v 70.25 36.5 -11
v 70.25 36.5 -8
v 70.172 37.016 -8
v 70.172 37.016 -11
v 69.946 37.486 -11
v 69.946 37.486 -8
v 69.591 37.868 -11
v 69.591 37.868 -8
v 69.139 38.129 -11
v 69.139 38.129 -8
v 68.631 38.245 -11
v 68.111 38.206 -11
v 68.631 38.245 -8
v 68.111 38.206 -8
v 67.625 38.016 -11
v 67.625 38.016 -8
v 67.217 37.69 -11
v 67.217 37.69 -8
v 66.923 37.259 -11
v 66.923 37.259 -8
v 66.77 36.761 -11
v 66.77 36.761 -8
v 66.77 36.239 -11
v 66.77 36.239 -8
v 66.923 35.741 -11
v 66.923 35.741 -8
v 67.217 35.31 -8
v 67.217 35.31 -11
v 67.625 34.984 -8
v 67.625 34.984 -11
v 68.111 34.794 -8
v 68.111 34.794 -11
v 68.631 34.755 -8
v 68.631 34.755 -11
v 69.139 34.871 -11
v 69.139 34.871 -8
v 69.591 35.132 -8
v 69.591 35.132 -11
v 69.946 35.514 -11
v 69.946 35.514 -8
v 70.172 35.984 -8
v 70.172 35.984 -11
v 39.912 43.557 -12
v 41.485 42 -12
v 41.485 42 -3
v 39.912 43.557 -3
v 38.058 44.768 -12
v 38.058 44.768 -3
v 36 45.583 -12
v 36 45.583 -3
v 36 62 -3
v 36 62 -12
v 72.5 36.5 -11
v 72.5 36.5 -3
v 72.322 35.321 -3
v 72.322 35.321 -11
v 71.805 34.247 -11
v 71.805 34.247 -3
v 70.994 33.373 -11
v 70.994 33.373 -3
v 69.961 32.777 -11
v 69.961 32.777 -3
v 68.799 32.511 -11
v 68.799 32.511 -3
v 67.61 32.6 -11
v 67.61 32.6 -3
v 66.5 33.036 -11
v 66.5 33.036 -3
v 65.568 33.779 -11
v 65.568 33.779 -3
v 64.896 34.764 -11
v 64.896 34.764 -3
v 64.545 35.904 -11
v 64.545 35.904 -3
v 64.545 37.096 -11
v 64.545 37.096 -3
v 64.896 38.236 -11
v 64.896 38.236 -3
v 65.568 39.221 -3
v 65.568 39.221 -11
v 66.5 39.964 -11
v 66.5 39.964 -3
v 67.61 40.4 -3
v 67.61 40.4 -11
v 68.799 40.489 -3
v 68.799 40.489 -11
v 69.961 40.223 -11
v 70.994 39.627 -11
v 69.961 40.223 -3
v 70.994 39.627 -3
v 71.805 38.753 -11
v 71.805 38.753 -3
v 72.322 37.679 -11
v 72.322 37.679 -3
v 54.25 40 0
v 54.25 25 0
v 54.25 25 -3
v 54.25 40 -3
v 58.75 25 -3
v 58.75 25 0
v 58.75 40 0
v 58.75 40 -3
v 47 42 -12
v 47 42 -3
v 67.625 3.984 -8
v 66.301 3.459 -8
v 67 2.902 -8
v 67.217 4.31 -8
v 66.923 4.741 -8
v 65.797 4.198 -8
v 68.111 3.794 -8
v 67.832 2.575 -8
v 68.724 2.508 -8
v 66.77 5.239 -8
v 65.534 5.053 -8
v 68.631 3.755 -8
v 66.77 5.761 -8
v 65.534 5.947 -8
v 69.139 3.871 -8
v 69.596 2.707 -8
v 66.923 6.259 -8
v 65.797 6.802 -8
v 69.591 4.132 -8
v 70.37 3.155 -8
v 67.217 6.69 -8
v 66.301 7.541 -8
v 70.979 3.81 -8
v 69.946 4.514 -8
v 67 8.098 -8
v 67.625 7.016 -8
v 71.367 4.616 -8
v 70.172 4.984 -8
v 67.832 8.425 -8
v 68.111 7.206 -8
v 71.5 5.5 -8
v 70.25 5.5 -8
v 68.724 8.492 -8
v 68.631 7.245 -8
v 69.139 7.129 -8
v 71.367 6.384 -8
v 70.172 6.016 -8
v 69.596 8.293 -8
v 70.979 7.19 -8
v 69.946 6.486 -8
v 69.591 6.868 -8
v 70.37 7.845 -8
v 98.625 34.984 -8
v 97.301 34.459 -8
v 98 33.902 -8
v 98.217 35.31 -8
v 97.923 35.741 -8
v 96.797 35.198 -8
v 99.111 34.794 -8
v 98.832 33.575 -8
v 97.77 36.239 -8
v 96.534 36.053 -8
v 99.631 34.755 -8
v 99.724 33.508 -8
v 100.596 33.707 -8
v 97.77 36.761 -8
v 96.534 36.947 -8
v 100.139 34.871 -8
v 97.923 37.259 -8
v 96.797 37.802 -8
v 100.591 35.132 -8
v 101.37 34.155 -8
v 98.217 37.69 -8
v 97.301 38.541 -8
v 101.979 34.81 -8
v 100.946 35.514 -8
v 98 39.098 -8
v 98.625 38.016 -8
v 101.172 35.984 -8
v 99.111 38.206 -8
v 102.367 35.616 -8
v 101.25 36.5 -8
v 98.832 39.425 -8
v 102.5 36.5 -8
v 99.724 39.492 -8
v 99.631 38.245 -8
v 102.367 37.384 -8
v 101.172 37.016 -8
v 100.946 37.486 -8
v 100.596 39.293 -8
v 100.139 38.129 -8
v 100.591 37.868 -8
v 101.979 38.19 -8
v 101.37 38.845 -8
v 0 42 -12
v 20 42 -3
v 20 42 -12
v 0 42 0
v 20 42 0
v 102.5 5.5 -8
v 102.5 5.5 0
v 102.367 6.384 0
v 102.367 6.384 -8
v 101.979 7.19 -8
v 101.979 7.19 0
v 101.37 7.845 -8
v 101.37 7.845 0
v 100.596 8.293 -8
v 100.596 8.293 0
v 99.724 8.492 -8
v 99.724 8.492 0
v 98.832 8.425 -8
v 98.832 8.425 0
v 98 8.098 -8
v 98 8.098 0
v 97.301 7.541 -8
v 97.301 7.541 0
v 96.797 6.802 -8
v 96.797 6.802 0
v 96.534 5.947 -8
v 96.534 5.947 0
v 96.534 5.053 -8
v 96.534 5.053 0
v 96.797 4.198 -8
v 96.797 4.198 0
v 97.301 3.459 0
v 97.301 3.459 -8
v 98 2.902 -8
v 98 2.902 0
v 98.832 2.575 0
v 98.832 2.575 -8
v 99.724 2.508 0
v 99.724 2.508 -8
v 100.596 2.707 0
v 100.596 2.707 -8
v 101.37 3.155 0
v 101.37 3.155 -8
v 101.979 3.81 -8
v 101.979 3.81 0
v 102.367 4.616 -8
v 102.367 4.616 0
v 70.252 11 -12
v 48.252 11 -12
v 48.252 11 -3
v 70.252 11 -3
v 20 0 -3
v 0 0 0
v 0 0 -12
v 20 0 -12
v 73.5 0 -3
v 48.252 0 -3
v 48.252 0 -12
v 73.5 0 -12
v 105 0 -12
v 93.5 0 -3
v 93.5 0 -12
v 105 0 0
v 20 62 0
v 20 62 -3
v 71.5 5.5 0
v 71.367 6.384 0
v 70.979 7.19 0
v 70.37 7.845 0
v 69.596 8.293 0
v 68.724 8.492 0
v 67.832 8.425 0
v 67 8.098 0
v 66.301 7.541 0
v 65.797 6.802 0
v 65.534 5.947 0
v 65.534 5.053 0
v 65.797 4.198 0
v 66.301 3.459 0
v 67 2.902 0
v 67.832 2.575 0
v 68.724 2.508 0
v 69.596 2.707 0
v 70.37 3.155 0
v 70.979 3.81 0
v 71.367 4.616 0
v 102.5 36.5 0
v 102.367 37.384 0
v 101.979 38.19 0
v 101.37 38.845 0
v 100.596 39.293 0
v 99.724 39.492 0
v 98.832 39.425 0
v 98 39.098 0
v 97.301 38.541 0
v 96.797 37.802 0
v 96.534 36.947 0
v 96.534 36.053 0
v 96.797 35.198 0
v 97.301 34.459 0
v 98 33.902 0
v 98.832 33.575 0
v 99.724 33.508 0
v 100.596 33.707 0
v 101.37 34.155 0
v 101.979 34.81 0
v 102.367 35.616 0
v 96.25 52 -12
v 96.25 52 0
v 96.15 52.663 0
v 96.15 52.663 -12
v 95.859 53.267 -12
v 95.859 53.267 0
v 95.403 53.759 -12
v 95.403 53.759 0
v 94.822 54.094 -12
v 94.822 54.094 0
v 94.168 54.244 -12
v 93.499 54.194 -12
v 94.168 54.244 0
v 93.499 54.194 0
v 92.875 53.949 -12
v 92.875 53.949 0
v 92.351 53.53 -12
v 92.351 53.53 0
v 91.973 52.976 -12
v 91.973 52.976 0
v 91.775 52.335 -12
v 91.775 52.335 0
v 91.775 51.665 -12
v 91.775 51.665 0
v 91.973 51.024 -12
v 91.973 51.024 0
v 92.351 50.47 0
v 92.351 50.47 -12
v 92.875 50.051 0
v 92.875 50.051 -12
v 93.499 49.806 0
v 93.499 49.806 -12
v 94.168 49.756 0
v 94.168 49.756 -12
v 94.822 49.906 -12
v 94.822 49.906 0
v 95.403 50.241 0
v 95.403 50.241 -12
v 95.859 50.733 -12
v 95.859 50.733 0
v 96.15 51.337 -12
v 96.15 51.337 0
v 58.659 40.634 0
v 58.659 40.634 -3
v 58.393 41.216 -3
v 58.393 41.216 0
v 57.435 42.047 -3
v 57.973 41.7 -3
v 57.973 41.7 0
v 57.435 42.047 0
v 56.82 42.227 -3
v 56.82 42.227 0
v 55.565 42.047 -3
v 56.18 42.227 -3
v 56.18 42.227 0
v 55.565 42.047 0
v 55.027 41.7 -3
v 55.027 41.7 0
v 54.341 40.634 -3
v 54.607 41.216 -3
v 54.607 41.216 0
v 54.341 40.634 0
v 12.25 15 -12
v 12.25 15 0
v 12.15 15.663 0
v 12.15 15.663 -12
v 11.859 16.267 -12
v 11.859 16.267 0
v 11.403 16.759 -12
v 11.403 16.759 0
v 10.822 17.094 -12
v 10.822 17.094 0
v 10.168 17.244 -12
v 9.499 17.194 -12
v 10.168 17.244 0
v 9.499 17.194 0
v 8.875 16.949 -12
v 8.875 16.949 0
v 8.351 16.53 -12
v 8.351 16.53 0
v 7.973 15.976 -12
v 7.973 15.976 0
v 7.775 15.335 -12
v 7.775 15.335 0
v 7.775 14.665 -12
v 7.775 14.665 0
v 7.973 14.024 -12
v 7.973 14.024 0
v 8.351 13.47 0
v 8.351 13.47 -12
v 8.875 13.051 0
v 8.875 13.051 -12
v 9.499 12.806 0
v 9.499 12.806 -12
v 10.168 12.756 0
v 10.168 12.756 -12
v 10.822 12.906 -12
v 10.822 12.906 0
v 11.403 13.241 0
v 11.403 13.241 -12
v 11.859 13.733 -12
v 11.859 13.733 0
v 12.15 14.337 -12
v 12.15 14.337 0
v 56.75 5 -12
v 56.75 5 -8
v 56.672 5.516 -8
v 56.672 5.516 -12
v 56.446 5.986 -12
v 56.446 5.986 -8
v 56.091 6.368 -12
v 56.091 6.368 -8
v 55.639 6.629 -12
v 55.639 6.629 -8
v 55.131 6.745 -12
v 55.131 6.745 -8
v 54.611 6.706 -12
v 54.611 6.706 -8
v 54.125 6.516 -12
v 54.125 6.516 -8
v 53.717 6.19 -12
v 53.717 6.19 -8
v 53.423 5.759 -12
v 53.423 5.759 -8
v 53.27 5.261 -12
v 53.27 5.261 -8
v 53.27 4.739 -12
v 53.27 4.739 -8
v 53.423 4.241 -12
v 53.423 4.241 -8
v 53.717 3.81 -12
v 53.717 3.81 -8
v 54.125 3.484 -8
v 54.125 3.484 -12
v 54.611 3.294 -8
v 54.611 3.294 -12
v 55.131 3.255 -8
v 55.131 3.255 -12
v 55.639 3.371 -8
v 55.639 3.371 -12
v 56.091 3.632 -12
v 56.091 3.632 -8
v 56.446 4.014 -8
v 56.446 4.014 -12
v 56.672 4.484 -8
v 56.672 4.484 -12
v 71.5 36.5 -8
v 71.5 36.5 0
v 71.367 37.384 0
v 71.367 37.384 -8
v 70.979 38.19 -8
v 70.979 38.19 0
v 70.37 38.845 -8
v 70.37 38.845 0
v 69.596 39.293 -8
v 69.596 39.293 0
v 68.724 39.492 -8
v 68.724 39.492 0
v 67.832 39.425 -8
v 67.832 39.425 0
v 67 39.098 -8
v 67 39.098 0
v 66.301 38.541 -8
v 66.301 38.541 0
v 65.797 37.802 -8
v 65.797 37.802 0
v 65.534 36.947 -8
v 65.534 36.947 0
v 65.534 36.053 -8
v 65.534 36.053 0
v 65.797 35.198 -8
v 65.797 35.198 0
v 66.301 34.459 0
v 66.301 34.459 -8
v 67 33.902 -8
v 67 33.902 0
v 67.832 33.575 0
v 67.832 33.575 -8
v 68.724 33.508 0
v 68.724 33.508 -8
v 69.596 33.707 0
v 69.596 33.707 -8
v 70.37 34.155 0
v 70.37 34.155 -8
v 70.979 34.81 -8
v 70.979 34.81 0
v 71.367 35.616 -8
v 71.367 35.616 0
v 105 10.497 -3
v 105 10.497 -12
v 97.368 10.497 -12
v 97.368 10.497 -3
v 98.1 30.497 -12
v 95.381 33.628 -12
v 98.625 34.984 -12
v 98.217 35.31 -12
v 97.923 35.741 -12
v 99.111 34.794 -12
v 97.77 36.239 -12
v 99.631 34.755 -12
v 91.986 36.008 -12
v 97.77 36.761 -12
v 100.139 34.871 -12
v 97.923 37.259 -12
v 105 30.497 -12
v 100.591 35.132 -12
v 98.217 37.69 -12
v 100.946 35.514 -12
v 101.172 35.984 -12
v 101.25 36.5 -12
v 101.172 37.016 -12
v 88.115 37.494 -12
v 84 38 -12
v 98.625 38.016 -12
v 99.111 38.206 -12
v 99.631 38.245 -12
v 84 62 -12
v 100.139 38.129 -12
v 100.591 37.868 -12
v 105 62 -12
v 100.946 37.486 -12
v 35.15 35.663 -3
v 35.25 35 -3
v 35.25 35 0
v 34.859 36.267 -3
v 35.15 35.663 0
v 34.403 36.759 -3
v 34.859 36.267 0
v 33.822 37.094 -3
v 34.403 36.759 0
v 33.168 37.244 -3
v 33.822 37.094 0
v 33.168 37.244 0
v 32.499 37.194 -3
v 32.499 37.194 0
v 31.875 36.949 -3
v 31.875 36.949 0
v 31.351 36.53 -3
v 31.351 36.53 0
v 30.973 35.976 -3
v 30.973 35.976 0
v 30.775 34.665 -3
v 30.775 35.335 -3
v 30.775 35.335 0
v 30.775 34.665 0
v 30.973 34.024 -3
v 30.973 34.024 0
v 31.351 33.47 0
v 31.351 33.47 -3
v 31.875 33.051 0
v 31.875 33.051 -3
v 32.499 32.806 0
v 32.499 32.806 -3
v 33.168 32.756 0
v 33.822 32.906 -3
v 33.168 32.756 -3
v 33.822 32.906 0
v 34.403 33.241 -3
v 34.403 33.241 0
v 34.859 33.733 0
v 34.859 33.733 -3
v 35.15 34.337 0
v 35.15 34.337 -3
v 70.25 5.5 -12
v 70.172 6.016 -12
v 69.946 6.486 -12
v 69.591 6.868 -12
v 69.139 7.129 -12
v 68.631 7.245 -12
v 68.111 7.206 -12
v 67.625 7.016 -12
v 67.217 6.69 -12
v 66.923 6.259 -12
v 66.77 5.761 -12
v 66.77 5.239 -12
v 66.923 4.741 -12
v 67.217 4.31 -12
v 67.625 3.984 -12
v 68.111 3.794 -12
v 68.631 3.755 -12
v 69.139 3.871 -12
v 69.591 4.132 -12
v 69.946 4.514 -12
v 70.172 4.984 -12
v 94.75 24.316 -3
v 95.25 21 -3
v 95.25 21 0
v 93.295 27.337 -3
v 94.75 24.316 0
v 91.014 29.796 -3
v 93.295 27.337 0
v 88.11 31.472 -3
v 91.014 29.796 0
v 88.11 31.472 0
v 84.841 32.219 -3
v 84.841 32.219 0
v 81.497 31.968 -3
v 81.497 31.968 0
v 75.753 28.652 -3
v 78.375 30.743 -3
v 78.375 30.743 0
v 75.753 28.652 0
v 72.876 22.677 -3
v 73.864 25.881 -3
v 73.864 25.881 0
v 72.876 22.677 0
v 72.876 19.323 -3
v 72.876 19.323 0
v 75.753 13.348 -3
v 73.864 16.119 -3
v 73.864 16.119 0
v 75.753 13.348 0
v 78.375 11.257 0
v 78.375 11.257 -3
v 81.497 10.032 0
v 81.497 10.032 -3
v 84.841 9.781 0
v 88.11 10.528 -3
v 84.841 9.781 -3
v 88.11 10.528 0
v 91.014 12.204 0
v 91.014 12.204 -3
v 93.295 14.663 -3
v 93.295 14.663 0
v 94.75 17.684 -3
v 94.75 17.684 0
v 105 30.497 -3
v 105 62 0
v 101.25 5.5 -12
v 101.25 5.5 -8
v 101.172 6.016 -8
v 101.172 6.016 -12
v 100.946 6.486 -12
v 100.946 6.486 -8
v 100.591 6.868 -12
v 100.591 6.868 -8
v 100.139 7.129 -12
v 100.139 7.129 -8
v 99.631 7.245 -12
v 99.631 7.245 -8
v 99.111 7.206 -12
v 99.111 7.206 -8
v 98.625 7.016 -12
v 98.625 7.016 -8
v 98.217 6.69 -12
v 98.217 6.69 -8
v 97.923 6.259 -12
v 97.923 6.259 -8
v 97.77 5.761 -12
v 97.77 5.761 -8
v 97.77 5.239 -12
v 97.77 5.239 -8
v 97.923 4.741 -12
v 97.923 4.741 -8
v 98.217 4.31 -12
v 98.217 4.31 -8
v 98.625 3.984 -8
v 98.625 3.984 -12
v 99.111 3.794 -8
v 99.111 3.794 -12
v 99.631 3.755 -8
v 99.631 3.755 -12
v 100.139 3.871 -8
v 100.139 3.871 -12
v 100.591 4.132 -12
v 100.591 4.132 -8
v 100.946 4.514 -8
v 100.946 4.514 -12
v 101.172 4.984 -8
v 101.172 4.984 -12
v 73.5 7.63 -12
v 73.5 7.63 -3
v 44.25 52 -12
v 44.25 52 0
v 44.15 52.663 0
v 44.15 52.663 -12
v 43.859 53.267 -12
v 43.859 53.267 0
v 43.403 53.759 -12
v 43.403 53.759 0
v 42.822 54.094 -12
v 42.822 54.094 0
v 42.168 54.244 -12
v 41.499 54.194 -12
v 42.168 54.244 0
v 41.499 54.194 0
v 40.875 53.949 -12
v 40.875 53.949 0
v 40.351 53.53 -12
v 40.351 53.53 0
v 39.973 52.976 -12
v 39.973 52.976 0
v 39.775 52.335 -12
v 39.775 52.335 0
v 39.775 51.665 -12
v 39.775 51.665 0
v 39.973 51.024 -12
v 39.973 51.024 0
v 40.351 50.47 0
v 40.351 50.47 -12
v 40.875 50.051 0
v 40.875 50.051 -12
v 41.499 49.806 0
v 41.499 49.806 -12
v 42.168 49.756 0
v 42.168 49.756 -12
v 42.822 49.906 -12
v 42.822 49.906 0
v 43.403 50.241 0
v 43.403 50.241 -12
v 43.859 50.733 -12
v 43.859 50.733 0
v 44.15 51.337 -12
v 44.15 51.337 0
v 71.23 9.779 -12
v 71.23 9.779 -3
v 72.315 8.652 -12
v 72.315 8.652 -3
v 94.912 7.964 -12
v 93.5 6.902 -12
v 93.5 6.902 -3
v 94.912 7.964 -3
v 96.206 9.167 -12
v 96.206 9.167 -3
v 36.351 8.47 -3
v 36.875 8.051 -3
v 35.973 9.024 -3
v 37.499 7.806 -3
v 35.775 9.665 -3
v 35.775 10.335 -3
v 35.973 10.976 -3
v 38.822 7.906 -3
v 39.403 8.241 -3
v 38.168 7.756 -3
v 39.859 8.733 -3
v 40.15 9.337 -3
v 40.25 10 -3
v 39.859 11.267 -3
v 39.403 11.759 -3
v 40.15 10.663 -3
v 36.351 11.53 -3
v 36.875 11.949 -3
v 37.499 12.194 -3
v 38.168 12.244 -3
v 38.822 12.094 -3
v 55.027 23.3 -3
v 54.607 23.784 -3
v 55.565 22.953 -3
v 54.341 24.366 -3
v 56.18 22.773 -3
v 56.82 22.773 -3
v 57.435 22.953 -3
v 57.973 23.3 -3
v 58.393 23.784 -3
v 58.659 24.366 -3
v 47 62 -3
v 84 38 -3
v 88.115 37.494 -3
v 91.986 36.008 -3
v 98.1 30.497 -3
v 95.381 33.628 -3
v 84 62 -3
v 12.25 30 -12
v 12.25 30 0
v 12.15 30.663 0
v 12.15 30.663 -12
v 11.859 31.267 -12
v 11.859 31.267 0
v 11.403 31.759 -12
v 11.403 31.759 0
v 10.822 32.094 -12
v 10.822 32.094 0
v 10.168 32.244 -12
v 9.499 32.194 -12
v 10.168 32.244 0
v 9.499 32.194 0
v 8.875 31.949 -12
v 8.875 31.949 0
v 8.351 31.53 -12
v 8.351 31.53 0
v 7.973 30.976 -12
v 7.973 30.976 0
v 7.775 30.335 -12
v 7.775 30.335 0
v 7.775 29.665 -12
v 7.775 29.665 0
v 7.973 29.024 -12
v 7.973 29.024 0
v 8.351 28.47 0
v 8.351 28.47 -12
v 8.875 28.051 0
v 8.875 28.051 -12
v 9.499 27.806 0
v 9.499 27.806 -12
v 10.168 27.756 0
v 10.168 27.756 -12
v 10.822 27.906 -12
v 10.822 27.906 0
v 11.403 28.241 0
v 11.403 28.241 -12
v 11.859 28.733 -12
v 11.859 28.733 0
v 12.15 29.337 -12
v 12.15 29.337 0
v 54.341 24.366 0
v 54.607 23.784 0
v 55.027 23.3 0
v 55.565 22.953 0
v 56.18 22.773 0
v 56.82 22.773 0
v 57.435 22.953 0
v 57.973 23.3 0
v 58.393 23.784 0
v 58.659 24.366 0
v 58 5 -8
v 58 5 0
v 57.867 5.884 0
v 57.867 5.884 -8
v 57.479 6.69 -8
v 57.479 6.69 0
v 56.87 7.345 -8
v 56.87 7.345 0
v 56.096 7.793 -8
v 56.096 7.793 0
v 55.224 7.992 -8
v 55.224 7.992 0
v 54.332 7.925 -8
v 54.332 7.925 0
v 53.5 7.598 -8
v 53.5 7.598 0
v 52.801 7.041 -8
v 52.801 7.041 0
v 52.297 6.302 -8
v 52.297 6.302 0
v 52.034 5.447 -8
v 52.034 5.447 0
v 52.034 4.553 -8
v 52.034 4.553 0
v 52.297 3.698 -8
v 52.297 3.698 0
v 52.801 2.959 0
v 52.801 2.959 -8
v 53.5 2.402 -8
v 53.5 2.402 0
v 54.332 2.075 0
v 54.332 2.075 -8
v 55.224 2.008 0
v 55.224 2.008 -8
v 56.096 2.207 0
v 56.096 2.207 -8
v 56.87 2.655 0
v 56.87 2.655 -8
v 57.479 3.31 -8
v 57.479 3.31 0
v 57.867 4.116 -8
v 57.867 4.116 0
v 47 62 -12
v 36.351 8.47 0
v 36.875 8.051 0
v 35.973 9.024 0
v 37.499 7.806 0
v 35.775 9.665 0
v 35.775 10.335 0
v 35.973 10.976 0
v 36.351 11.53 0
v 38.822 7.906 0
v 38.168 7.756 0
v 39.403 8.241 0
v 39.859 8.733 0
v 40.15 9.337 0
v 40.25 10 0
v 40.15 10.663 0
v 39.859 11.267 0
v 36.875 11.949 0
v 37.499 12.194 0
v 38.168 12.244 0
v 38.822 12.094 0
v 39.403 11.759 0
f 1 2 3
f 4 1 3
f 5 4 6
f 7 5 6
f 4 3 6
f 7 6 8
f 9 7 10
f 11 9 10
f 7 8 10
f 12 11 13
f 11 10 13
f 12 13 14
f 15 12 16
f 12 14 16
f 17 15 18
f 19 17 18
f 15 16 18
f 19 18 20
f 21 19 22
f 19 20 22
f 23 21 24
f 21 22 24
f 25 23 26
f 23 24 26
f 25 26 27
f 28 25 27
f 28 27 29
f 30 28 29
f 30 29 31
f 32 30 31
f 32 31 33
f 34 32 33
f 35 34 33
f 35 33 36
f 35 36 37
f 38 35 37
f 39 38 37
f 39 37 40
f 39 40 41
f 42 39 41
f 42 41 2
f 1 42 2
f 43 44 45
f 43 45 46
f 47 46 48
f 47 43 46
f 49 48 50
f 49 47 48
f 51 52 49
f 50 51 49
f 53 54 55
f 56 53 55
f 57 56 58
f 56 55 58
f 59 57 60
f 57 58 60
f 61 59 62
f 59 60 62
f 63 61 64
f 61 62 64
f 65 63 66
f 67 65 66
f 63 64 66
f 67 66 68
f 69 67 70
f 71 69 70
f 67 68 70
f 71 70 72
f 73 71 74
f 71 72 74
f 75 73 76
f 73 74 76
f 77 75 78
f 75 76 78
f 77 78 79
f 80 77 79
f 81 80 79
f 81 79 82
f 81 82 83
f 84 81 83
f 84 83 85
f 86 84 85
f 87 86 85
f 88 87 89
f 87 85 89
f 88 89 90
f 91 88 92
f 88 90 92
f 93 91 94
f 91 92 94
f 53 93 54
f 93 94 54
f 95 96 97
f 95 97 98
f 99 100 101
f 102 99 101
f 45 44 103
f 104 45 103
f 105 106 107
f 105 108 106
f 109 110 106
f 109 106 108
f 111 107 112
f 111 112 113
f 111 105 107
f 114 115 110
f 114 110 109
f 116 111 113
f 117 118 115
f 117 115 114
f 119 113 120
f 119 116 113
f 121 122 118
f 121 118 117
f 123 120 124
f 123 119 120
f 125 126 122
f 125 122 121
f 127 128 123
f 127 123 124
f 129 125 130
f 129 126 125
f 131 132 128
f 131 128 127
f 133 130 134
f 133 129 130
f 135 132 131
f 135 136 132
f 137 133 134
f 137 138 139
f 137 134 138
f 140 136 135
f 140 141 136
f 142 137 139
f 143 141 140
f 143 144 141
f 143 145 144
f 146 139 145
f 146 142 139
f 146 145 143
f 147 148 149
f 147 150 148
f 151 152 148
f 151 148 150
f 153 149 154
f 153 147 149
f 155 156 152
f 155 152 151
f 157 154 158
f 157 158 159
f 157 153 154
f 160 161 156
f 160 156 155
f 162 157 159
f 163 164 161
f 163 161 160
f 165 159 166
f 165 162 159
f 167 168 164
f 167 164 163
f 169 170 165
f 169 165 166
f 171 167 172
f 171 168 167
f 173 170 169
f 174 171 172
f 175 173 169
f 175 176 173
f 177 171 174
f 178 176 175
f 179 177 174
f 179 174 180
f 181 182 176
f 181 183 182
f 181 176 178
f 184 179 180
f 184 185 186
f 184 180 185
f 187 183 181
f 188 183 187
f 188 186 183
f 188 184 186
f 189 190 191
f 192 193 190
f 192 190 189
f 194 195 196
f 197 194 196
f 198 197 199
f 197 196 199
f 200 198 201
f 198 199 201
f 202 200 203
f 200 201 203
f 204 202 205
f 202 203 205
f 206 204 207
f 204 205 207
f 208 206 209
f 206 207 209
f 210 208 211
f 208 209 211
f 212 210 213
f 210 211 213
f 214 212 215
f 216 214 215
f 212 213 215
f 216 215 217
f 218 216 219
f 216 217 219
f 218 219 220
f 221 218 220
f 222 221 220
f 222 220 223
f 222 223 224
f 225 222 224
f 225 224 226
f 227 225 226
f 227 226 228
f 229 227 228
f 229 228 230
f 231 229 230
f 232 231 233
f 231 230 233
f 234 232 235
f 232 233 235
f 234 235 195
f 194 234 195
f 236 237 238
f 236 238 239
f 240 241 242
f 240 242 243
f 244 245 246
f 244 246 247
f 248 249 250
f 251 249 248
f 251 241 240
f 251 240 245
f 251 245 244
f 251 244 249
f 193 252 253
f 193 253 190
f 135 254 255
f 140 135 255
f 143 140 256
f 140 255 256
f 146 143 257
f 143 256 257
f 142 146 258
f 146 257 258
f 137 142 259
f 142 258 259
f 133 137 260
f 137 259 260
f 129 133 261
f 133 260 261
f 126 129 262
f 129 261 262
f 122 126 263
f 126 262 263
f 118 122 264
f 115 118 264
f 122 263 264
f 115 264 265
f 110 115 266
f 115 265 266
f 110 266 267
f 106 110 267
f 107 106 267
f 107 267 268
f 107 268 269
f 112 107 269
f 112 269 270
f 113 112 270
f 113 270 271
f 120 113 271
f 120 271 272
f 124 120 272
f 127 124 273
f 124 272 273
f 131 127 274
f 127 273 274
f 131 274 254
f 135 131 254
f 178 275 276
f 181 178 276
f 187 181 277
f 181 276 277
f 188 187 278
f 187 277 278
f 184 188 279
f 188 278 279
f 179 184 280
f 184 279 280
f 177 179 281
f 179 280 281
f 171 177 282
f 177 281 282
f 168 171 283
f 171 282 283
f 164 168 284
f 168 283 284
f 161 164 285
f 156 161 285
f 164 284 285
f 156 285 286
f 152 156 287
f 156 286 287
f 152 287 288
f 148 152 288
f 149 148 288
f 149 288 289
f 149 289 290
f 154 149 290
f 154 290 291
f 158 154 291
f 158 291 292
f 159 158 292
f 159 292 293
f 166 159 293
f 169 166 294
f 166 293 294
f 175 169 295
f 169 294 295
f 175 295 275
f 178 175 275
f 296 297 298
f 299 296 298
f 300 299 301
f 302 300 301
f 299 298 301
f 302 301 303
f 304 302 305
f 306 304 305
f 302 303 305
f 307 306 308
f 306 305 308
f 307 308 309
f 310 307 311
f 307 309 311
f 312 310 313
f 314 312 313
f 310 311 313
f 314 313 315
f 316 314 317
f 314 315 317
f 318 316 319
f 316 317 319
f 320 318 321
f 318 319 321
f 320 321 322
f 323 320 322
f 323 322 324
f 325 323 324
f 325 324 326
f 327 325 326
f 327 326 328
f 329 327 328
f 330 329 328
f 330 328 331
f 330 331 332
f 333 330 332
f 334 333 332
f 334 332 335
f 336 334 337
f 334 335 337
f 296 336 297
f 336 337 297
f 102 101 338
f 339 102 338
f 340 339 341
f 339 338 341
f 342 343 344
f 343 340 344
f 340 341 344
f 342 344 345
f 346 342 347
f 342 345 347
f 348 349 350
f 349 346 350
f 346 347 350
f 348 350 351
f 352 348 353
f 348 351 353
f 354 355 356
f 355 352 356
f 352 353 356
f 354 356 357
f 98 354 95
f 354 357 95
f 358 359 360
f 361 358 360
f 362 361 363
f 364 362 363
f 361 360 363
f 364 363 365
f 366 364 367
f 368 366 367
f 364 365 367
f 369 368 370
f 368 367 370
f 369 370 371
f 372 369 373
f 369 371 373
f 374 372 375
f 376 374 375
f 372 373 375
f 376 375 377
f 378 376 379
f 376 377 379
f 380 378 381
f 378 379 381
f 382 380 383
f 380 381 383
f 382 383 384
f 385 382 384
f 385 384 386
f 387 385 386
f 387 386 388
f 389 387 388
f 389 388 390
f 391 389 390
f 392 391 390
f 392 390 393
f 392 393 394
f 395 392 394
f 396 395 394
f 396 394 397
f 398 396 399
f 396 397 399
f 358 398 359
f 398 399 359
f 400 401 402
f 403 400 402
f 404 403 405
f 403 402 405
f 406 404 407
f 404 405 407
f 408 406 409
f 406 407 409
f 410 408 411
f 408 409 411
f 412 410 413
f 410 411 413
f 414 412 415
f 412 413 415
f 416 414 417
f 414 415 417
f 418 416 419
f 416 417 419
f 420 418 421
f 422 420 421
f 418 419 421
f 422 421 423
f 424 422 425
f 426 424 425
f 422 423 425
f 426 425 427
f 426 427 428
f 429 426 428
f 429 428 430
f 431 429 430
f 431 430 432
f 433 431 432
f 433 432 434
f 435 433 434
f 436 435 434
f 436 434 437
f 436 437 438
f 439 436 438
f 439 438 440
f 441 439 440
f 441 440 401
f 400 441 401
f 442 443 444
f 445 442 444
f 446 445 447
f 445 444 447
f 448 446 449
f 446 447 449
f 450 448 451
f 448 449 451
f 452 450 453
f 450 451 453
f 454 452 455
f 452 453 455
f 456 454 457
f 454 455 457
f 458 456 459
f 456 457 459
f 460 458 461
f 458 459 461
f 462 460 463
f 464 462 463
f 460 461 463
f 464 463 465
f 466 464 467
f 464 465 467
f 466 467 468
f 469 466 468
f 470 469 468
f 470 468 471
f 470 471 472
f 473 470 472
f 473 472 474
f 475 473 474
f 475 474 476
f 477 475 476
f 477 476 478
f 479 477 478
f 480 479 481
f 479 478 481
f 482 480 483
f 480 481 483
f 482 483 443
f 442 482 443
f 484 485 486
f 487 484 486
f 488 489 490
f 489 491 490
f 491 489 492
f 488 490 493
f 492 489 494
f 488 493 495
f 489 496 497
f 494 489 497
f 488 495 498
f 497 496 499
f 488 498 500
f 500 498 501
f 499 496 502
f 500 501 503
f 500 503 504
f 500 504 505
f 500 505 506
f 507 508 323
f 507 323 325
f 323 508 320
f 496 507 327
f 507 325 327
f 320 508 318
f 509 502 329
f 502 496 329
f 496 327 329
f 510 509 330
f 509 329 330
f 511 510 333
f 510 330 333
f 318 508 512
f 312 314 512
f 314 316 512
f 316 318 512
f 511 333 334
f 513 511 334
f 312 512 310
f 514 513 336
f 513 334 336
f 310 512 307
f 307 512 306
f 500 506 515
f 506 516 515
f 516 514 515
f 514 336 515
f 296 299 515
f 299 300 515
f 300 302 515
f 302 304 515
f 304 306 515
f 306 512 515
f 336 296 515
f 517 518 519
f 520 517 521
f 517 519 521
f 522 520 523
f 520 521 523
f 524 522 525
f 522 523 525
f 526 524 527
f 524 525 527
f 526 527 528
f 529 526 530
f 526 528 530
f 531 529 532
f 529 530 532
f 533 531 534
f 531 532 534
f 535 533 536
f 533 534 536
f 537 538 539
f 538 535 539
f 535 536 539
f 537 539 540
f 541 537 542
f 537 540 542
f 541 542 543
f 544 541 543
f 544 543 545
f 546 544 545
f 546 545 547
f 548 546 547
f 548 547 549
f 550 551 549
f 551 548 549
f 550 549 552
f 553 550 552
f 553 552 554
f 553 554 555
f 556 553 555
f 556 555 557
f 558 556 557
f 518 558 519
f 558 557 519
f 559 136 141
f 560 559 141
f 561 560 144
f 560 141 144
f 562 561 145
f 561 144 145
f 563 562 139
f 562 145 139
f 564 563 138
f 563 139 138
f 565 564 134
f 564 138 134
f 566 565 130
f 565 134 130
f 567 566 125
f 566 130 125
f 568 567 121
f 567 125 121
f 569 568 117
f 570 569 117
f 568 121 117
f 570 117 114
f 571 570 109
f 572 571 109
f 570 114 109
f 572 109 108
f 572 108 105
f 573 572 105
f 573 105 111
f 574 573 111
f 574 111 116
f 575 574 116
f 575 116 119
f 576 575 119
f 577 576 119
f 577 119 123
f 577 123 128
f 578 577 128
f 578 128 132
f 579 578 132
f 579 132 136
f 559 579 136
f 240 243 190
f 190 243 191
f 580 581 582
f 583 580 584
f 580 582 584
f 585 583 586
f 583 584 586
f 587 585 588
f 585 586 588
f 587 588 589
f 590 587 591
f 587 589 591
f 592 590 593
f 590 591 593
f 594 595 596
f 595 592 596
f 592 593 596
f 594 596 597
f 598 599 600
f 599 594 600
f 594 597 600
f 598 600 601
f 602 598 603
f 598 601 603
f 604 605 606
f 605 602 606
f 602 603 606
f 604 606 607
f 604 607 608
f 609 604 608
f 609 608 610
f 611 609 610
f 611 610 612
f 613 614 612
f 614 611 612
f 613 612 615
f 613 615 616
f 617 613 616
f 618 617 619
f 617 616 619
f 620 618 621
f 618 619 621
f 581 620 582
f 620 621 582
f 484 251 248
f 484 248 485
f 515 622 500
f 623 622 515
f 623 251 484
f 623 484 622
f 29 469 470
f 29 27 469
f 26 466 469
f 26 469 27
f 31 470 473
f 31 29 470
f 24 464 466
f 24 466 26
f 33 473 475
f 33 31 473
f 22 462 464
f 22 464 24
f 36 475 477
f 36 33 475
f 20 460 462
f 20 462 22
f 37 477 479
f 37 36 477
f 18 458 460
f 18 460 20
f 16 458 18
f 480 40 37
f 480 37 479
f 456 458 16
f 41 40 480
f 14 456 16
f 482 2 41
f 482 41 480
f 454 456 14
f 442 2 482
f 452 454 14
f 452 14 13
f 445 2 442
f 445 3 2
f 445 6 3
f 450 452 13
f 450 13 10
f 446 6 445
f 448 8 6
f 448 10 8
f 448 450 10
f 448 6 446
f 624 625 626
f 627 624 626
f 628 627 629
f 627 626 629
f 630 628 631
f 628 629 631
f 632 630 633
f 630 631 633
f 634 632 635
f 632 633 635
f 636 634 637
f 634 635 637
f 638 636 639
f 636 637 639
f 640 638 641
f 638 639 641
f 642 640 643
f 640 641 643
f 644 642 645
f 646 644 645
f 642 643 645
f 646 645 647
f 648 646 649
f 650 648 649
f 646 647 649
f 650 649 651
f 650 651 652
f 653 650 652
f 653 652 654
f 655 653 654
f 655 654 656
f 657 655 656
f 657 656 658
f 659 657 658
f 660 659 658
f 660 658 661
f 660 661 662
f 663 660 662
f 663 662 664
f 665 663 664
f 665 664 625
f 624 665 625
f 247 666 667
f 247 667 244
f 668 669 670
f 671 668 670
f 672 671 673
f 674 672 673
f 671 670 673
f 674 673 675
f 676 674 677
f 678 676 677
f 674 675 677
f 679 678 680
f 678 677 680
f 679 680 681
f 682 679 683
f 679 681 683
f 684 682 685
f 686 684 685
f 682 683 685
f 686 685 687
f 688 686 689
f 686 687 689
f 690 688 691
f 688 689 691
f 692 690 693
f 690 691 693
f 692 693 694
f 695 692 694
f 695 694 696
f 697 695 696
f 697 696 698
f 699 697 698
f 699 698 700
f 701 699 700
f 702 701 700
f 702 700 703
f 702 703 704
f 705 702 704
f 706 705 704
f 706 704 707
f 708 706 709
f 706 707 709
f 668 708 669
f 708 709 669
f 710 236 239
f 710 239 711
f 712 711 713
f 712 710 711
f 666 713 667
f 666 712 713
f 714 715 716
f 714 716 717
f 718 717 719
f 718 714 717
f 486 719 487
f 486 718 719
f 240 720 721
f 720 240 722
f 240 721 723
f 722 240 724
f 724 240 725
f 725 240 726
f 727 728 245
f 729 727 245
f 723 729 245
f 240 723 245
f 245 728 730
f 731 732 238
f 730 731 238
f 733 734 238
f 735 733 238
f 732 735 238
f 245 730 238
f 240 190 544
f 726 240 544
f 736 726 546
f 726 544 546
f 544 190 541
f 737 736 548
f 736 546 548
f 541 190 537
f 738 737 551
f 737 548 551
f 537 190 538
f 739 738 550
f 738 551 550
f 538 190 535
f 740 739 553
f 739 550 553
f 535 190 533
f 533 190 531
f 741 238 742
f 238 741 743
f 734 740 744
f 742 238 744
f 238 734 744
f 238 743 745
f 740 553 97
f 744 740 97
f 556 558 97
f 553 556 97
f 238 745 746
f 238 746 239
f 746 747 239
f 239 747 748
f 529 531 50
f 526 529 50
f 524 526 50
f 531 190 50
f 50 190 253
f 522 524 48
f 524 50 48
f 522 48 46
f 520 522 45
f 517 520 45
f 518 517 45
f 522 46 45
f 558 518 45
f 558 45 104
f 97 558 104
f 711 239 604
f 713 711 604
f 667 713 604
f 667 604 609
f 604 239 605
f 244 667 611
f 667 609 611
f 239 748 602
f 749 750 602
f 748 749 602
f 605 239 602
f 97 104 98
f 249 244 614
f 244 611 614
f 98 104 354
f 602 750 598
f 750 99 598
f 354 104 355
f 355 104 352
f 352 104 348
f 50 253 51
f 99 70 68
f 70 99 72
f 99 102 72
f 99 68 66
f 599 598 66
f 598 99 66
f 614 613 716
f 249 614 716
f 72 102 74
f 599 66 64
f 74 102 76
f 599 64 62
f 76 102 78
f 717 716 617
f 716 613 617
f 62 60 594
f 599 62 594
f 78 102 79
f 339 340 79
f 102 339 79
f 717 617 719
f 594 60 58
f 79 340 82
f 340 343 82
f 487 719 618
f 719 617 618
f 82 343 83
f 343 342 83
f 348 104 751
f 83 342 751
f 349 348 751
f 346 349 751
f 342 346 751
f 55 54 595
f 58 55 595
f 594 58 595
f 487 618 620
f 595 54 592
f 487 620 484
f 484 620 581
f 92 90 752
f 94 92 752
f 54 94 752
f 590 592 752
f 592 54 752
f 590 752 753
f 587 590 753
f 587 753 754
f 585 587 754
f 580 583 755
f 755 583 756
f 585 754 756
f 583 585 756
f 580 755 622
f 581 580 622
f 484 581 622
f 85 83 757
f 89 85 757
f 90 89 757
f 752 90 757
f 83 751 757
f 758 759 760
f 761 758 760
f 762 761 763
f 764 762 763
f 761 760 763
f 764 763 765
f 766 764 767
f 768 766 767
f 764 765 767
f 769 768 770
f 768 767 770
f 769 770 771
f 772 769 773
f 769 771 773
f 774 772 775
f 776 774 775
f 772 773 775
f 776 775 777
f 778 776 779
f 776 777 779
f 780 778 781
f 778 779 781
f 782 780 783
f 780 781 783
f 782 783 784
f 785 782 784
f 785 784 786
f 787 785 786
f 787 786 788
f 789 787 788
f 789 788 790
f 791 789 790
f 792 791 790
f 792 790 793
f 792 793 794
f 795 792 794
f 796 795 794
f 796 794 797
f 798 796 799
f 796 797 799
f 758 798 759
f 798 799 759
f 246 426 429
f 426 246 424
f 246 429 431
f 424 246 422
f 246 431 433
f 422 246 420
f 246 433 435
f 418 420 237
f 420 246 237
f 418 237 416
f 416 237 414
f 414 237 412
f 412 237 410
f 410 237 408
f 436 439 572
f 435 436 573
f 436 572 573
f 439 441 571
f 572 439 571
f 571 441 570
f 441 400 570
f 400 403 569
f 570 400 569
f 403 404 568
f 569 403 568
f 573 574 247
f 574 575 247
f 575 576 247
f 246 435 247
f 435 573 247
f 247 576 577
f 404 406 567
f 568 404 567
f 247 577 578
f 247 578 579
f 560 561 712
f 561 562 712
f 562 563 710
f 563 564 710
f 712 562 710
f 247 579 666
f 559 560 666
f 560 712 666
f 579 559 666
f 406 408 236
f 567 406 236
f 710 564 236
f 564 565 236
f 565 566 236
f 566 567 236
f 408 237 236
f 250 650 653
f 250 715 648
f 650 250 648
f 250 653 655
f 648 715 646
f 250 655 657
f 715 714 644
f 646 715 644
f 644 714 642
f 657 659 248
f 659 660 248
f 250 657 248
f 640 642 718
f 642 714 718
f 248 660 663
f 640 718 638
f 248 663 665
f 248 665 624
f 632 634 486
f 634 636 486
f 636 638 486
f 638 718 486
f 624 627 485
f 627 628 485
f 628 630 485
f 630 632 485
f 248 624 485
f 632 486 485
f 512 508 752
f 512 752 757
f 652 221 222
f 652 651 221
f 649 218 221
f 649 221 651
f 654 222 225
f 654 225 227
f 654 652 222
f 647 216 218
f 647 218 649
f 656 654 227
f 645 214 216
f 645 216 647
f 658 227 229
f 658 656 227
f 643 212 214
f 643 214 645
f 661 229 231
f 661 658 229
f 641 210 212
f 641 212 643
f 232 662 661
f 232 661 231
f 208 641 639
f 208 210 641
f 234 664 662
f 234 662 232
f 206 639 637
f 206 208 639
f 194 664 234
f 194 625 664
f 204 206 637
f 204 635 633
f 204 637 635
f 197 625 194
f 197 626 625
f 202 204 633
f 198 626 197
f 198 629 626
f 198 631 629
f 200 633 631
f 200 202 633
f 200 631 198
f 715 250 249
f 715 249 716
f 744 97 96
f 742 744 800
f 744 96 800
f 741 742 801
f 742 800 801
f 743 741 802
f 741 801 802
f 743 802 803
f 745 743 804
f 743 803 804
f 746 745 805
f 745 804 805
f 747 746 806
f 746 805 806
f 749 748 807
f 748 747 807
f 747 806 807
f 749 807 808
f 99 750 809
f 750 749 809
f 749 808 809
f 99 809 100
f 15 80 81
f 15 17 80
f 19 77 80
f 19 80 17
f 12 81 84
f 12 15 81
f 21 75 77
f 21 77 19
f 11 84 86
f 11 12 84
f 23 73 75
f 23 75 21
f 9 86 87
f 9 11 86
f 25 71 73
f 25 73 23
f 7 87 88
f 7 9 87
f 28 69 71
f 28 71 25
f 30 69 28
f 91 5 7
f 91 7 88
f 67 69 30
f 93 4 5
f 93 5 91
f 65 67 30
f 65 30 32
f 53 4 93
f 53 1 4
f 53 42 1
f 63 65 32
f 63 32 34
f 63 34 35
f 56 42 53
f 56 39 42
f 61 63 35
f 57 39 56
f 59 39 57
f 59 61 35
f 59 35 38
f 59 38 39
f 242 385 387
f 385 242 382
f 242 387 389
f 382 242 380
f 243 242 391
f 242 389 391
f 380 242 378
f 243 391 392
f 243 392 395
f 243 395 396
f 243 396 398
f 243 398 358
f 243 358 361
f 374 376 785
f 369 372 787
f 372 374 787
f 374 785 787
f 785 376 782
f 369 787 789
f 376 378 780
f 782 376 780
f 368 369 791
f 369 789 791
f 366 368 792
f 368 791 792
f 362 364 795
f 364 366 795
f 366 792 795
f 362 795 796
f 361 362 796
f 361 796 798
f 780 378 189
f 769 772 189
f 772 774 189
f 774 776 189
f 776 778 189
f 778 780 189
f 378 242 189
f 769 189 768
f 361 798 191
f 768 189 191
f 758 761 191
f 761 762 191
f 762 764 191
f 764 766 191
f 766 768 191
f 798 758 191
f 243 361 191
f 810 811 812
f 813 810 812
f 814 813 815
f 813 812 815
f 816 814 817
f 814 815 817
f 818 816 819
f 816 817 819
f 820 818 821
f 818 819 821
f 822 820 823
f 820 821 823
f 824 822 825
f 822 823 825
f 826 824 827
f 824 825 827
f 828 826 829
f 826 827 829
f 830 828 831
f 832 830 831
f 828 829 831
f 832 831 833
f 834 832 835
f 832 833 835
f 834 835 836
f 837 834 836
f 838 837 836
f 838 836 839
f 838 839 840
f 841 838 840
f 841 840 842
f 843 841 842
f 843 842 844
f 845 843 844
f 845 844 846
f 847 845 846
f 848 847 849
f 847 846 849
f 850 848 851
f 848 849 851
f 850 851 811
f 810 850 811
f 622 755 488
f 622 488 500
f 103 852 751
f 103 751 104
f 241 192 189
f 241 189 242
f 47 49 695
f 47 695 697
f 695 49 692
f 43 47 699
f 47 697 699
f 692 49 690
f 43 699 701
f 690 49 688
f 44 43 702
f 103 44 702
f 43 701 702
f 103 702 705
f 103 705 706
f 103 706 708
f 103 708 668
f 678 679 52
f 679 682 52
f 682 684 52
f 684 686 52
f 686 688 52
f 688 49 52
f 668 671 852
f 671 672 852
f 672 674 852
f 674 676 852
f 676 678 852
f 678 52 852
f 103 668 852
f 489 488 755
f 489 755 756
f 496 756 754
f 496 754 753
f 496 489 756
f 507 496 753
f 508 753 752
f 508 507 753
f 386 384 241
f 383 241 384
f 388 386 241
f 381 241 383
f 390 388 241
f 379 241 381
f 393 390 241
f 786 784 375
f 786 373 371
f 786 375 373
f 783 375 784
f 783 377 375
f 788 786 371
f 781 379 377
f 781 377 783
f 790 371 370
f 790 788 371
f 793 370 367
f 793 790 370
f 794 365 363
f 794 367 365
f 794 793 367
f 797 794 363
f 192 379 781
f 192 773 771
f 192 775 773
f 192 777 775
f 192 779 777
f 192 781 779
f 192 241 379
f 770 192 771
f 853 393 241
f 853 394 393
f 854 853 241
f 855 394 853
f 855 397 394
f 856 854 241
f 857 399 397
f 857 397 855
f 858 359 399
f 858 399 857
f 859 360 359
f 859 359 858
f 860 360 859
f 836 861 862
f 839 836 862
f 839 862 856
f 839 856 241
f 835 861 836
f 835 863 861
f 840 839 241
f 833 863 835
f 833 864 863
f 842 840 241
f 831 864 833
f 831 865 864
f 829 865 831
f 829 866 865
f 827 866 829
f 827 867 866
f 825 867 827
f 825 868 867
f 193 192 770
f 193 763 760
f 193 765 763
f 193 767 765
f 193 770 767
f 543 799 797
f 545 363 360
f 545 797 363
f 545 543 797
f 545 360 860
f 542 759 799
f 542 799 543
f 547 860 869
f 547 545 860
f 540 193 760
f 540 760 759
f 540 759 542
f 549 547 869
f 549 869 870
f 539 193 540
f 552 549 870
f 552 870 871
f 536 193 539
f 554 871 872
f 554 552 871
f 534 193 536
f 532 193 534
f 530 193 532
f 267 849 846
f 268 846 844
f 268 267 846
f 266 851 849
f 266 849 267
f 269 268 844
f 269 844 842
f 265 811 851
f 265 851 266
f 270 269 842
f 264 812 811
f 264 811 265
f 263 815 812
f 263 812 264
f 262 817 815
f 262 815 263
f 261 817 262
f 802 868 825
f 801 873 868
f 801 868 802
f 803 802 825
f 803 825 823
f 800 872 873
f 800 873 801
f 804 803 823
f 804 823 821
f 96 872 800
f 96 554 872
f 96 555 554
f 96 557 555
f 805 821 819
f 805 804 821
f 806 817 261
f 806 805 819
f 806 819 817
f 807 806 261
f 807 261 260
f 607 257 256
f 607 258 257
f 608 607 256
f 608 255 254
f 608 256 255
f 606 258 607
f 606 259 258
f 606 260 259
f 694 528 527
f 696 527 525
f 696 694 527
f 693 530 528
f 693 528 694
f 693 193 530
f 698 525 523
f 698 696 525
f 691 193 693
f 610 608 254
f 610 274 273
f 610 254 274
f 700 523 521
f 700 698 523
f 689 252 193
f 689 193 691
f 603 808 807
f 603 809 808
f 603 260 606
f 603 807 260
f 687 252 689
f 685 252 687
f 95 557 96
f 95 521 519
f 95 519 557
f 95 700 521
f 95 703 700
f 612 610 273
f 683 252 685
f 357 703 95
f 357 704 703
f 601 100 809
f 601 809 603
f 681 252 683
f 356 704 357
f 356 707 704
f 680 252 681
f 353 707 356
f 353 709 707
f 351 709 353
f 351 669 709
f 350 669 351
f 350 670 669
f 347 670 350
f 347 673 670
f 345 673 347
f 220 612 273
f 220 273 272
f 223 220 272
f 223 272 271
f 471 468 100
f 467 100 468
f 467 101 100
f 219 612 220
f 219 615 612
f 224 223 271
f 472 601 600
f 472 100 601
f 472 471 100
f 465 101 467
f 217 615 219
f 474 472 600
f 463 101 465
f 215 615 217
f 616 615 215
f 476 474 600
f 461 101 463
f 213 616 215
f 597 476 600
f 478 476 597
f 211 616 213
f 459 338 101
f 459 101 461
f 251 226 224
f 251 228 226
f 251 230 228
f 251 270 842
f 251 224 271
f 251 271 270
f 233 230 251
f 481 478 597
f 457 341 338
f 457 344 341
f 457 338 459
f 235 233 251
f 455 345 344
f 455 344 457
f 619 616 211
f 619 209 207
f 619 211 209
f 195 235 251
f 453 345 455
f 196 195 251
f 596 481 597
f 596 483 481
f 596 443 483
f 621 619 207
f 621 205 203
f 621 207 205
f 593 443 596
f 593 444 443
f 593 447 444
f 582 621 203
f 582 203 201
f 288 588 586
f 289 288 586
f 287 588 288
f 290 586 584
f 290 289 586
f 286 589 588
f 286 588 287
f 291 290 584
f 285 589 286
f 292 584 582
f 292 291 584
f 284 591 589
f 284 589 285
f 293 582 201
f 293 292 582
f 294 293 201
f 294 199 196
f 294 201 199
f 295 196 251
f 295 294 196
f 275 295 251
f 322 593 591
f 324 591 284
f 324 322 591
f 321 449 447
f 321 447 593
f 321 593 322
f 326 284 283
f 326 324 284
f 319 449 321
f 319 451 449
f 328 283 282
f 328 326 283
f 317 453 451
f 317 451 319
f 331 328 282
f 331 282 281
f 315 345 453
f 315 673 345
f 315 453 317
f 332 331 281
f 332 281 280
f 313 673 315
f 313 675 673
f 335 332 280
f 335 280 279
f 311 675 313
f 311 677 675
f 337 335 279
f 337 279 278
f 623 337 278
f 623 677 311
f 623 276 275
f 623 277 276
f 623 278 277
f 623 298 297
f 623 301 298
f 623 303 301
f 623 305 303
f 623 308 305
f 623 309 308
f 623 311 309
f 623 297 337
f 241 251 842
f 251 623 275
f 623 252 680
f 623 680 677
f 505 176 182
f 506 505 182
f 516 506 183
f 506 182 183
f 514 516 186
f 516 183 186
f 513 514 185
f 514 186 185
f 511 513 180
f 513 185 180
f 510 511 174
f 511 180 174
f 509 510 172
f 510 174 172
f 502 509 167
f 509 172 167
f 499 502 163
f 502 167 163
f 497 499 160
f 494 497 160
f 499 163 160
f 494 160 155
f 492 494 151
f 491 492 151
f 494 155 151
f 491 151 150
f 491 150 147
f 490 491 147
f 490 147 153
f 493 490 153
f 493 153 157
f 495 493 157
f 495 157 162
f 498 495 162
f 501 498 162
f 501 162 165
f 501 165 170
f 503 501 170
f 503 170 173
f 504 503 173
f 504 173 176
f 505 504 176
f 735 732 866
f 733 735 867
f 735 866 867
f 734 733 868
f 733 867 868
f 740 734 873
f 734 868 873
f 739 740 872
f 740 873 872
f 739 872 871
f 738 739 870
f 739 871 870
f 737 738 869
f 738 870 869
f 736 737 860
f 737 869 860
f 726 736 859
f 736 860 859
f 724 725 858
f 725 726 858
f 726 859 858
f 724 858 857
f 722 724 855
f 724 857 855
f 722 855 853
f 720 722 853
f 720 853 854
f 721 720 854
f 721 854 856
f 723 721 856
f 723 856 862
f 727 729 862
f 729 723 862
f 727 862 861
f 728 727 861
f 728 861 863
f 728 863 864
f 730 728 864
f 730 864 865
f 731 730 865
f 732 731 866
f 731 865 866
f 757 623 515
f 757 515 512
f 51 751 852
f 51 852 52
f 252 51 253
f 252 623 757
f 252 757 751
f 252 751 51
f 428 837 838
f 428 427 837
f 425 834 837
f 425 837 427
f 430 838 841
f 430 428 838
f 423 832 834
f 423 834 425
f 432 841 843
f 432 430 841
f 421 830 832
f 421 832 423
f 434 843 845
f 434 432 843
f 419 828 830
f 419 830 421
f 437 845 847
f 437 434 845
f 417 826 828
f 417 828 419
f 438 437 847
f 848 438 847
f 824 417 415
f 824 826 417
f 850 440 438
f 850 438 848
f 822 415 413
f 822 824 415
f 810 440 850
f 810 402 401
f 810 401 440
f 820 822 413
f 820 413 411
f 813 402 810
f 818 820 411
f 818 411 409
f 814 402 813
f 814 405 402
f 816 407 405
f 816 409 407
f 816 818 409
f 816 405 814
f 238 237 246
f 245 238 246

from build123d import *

# Parameters (mm, degrees)
SKETCH_R        = 2.25
SKETCH_R_2      = 11.25
SKETCH_R_3      = 1.75
PAD_DEPTH       = 12
POCKET_DEPTH    = 9
SKETCH002_R     = 4
PAD001_DEPTH    = 8
SKETCH003_R     = 3
POCKET001_DEPTH = 8
SKETCH004_R     = 1.75
POCKET002_DEPTH = 5


with BuildPart() as pocket_belt_path:
    # Sketch → Pad (new body)
    with BuildSketch(Plane.XY):
        Polygon((0, 0), (105, 0), (105, 62), (20, 62), (20, 42), (0, 42), align=None)
        with Locations((38, 10)):
            Circle(SKETCH_R, mode=Mode.SUBTRACT)
        with Locations((33, 35)):
            Circle(SKETCH_R, mode=Mode.SUBTRACT)
        with Locations((84, 21)):
            Circle(SKETCH_R_2, mode=Mode.SUBTRACT)
        with Locations((68.5, 36.5)):
            Circle(SKETCH_R_3, mode=Mode.SUBTRACT)
        with Locations((99.5, 36.5)):
            Circle(SKETCH_R_3, mode=Mode.SUBTRACT)
        with Locations((68.5, 5.5)):
            Circle(SKETCH_R_3, mode=Mode.SUBTRACT)
        with Locations((99.5, 5.5)):
            Circle(SKETCH_R_3, mode=Mode.SUBTRACT)
        with Locations((10, 30)):
            Circle(SKETCH_R, mode=Mode.SUBTRACT)
        with Locations((10, 15)):
            Circle(SKETCH_R, mode=Mode.SUBTRACT)
        with Locations((42, 52)):
            Circle(SKETCH_R, mode=Mode.SUBTRACT)
        with Locations((94, 52)):
            Circle(SKETCH_R, mode=Mode.SUBTRACT)
        with Locations((55, 5)):
            Circle(SKETCH_R_3, mode=Mode.SUBTRACT)
        with BuildLine():
            Line((58.75, 25.000001), (58.75, 40))
            ThreePointArc((58.75, 40), (56.5, 42.25), (54.25, 39.999999))
            Line((54.25, 25), (54.25, 39.999999))
            ThreePointArc((54.25, 25), (56.5, 22.75), (58.75, 25.000001))
        make_face(mode=Mode.SUBTRACT)
    extrude(amount=PAD_DEPTH)

    # Sketch001 → Pocket (cut)
    with BuildSketch(Plane.XY.offset(12)):
        with BuildLine():
            ThreePointArc((41.485277, 42), (39.015593, 44.209375), (35.999996, 45.583005))
            Line((35.999996, 67), (35.999996, 45.583005))
            Line((20, 67), (35.999996, 67))
            Line((20, -1), (20, 67))
            Line((20, -1), (48.252269, -1))
            Line((48.252269, 11), (48.252269, -1))
            Line((48.252269, 11), (70.252269, 11))
            ThreePointArc((70.252269, 11), (71.759618, 9.202833), (73.499996, 7.630258))
            Line((73.499996, 7.630258), (73.499996, -1))
            Line((73.499996, -1), (93.499996, -1))
            Line((93.499996, -1), (93.499996, 6.902128))
            ThreePointArc((93.499996, 6.902128), (95.574295, 8.548671), (97.367695, 10.497399))
            Line((105.499996, 10.497399), (97.367695, 10.497399))
            Line((105.499996, 30.497399), (105.499996, 10.497399))
            Line((98.099621, 30.497399), (105.499996, 30.497399))
            ThreePointArc((98.099621, 30.497399), (91.98574, 36.007594), (83.999996, 38))
            Line((83.999996, 38), (83.999996, 67))
            Line((83.999996, 67), (46.999996, 67))
            Line((46.999996, 67), (46.999996, 42))
            Line((41.485277, 42), (46.999996, 42))
        make_face()
    extrude(amount=-POCKET_DEPTH, mode=Mode.SUBTRACT)


with BuildPart() as pocket002:
    # Part__Mirroring: instance of Pocket belt path
    add(pocket_belt_path.part.mirror(Plane(origin=(52.5, 31, 0), x_dir=(0, 1, 0), z_dir=(0, 0, 1))))

    # Sketch002 → Pad001 (new body)
    with BuildSketch(Plane(origin=(0, 0, -3), x_dir=(1, 0, 0), z_dir=(0, 0, -1))):
        with Locations((68.5, -36.5)):
            Circle(SKETCH002_R)
    extrude(amount=PAD001_DEPTH)

    # Sketch003 → Pocket001 (cut)
    with BuildSketch(Plane.XY):
        with Locations((55, 5)):
            Circle(SKETCH003_R)
        with Locations((68.5, 36.5)):
            Circle(SKETCH003_R)
        with Locations((68.5, 5.5)):
            Circle(SKETCH003_R)
        with Locations((99.5, 36.5)):
            Circle(SKETCH003_R)
        with Locations((99.5, 5.5)):
            Circle(SKETCH003_R)
    extrude(amount=-POCKET001_DEPTH, mode=Mode.SUBTRACT)

    # Sketch004 → Pocket002 (cut)
    with BuildSketch(Plane.XY.offset(-8)):
        with Locations((68.5, 36.5)):
            Circle(SKETCH004_R)
    extrude(amount=-POCKET002_DEPTH, mode=Mode.SUBTRACT)


solid = pocket002.part
